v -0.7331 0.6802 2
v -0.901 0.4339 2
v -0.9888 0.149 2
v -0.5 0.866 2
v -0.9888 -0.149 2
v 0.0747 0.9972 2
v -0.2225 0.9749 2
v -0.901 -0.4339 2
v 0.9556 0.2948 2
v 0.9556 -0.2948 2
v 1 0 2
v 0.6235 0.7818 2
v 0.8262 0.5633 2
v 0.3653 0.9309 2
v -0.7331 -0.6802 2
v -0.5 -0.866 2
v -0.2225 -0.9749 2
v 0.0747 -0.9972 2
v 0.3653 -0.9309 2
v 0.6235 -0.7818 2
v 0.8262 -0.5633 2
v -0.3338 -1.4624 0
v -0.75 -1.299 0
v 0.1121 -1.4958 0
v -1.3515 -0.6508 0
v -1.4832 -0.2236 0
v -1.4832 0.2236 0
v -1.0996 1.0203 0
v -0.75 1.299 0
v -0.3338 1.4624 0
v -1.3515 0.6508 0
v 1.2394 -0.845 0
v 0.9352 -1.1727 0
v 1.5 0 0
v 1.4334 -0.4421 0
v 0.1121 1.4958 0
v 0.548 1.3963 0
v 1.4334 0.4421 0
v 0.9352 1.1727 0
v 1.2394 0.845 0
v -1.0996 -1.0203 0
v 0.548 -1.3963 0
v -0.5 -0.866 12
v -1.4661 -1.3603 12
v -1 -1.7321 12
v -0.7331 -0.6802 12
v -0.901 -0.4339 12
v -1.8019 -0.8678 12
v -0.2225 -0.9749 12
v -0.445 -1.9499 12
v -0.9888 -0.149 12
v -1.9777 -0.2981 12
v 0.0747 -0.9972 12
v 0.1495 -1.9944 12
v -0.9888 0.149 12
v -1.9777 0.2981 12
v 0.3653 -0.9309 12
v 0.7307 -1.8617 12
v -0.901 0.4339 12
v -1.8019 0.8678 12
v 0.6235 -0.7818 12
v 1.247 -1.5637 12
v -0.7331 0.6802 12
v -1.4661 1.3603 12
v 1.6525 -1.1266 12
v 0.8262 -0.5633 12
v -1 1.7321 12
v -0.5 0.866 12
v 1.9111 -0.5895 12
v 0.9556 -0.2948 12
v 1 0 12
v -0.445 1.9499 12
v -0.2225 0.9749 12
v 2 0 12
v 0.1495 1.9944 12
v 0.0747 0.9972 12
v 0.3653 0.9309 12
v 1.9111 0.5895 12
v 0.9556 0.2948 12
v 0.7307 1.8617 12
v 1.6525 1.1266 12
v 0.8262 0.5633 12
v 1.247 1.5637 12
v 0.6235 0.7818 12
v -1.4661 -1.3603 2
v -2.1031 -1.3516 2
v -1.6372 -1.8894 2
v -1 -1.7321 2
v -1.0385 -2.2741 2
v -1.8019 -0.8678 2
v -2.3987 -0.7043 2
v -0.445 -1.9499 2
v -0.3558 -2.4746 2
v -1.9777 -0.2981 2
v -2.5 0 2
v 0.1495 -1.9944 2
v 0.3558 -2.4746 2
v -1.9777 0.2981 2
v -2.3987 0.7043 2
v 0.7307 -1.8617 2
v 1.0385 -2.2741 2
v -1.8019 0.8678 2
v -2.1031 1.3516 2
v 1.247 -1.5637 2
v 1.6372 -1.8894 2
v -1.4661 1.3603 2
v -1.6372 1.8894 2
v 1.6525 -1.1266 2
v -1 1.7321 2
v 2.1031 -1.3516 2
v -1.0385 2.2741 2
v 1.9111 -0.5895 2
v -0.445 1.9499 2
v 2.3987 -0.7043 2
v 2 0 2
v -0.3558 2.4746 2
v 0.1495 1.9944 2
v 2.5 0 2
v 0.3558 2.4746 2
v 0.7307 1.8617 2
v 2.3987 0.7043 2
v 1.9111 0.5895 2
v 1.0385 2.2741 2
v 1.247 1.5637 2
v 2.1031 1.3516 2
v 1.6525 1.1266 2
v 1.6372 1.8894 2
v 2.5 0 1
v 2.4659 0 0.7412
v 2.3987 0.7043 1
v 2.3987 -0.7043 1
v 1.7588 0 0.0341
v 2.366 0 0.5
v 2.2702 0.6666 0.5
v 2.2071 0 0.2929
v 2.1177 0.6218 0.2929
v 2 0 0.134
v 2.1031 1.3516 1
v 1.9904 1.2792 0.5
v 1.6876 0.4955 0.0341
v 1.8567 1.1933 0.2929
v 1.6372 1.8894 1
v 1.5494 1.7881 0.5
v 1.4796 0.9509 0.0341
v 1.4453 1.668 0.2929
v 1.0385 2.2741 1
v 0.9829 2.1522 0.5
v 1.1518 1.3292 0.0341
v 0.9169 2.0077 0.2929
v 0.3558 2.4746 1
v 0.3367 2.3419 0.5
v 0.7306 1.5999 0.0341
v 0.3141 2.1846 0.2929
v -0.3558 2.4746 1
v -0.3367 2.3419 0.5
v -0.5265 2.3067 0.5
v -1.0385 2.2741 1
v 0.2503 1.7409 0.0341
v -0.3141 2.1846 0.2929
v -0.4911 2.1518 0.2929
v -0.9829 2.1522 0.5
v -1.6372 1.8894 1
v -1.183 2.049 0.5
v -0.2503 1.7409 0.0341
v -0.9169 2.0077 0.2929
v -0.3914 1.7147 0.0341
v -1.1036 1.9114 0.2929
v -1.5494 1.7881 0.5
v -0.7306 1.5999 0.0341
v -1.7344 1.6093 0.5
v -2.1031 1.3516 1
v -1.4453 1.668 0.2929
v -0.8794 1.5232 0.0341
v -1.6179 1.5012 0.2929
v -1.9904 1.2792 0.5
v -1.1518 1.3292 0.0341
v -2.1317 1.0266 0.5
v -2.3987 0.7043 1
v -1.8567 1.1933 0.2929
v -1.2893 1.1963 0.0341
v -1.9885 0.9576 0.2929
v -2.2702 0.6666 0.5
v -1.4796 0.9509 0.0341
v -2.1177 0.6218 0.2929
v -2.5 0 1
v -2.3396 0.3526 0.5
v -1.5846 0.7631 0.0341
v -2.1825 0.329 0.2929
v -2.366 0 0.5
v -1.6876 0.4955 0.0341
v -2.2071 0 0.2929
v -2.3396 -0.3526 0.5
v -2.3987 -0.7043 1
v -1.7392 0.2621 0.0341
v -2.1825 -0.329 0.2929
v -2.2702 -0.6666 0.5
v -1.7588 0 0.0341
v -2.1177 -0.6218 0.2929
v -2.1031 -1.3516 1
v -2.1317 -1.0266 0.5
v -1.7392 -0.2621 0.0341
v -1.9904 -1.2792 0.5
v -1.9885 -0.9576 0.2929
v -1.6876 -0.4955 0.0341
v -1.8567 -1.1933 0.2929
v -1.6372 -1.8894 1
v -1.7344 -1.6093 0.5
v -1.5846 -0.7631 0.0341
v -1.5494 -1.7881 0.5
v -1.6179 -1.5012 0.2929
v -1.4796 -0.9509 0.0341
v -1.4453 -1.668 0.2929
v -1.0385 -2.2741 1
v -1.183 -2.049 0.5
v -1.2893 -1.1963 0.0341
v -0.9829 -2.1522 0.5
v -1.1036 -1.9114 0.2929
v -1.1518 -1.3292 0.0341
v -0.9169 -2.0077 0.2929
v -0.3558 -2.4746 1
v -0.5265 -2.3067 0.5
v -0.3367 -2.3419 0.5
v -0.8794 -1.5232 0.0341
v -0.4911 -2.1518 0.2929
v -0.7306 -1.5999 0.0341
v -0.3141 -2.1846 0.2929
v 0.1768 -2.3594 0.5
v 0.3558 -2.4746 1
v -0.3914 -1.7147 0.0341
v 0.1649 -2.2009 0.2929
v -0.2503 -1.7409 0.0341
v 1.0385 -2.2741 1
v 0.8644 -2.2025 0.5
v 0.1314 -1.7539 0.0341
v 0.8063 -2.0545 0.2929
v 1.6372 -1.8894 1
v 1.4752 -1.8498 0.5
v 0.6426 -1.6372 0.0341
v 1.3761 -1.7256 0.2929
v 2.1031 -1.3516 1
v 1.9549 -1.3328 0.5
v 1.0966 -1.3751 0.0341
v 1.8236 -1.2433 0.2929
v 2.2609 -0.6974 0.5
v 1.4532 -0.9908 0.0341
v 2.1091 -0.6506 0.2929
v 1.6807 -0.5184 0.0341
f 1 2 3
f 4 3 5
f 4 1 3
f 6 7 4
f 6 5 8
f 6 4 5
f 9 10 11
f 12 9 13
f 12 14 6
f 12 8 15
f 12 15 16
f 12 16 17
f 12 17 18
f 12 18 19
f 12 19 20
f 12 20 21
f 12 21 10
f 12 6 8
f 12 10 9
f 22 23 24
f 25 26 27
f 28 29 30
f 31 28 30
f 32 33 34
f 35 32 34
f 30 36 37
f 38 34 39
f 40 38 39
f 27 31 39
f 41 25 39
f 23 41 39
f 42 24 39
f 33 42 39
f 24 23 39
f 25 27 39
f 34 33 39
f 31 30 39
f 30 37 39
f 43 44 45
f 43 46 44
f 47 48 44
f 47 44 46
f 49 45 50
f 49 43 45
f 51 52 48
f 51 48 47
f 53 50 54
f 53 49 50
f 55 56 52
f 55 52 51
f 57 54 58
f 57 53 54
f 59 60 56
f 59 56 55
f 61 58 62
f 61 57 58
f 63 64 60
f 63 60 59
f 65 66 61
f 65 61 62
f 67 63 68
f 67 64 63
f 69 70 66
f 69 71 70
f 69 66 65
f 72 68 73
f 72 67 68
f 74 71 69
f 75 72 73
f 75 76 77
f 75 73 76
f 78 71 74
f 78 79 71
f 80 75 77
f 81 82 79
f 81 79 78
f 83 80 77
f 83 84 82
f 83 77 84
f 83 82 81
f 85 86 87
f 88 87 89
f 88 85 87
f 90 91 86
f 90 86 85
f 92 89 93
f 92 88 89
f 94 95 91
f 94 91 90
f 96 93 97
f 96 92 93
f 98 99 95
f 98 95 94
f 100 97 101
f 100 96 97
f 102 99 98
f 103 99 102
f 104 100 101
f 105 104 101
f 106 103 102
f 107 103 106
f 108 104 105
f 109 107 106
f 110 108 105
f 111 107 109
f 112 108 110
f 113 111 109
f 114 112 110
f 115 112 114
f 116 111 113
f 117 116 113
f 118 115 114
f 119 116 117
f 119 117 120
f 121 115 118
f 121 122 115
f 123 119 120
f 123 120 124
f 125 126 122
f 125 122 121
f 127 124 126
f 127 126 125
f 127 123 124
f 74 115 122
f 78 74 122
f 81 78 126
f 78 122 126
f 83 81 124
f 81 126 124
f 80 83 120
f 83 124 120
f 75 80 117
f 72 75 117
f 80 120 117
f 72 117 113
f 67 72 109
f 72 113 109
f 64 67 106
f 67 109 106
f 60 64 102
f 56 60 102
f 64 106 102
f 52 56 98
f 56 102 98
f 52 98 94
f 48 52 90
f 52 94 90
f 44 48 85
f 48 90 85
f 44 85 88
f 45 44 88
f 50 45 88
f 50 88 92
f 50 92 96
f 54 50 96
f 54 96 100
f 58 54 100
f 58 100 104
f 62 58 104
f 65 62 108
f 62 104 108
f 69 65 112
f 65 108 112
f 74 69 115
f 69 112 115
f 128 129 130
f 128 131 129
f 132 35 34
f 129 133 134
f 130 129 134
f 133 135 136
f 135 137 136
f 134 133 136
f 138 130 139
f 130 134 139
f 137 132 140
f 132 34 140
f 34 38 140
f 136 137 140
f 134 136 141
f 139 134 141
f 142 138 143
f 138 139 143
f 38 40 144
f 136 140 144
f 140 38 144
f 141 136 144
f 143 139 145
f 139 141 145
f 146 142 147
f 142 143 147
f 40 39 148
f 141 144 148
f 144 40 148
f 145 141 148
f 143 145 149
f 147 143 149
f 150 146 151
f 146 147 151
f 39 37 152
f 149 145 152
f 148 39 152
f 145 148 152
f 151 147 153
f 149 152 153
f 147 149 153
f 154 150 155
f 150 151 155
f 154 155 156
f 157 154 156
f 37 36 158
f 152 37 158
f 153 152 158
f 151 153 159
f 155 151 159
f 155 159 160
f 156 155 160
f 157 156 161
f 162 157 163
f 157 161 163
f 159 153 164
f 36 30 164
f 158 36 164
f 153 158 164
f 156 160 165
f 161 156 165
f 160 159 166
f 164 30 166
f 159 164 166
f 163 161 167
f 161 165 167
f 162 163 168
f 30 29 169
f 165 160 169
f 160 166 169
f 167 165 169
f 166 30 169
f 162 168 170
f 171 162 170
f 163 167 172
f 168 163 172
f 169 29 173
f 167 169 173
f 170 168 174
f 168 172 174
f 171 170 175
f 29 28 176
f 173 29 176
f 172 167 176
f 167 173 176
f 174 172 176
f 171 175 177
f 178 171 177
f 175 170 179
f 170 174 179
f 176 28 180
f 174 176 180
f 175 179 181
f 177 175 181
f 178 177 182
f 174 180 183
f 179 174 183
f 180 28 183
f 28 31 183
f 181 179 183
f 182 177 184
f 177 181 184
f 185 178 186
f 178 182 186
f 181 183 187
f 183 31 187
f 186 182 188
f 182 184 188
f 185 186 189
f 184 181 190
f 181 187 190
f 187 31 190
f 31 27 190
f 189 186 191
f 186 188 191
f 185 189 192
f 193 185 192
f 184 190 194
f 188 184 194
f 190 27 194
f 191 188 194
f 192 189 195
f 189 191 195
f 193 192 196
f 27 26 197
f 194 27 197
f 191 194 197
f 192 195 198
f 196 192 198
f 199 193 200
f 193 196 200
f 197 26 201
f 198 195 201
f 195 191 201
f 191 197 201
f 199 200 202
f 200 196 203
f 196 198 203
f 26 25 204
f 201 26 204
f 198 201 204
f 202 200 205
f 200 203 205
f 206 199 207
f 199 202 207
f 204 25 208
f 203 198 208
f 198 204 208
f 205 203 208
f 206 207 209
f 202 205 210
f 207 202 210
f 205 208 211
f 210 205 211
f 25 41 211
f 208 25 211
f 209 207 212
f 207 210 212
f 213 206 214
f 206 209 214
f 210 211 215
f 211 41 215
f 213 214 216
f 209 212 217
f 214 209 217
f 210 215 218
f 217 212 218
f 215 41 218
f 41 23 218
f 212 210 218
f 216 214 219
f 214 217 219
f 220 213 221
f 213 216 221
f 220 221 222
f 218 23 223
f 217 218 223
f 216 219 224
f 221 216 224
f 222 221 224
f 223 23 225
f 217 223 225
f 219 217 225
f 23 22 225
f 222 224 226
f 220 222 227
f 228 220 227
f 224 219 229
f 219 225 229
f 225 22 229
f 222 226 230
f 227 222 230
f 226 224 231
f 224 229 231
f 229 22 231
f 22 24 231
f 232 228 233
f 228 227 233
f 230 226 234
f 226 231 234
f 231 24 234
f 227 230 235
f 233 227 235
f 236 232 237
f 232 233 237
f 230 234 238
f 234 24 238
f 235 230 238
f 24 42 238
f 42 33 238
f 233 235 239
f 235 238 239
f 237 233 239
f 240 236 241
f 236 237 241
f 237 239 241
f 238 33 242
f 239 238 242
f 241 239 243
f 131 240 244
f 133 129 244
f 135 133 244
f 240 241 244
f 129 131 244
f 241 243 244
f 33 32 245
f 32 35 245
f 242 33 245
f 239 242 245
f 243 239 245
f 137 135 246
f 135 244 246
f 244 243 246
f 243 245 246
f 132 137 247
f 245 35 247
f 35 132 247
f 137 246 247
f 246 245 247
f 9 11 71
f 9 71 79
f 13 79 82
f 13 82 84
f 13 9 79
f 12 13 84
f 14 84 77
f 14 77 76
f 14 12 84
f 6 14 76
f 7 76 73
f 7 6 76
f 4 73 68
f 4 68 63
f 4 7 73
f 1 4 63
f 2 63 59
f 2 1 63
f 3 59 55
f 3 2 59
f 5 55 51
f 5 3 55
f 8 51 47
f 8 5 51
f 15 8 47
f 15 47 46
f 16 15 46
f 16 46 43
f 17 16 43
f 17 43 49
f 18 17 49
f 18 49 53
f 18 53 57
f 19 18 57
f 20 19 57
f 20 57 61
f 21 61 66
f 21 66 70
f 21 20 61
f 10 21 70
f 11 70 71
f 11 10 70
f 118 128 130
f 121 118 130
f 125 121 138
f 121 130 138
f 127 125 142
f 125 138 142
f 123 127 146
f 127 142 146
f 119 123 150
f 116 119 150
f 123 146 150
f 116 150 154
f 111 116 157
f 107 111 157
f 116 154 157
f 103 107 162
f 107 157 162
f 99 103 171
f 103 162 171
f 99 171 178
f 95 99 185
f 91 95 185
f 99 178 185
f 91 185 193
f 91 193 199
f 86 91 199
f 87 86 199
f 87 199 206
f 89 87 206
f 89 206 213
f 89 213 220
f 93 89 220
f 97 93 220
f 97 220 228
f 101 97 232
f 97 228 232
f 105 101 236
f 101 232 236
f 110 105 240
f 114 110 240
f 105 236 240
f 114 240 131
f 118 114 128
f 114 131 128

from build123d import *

# Parameters (mm, degrees)
ESQUISSE1_R        = 2.5
BOSS_EXTRU_1_DEPTH = 2
ESQUISSE2_R        = 2
ESQUISSE2_R_2      = 1
BOSS_EXTRU_2_DEPTH = 10
CONG_1_R           = 1


with BuildPart() as part:
    # Esquisse1 → Boss.-Extru.1 (new body)
    with BuildSketch(Plane.XY):
        Circle(ESQUISSE1_R)
    extrude(amount=BOSS_EXTRU_1_DEPTH)

    # Esquisse2 → Boss.-Extru.2 (add)
    with BuildSketch(Plane.XY.offset(2)):
        Circle(ESQUISSE2_R)
        Circle(ESQUISSE2_R_2, mode=Mode.SUBTRACT)
    extrude(amount=BOSS_EXTRU_2_DEPTH)

    # Congé1
    cong_1_edges = [part.edges().sort_by_distance(p)[0] for p in [
        (-2.5, 0, 0),
    ]]
    fillet(cong_1_edges, radius=CONG_1_R)


solid = part.part
